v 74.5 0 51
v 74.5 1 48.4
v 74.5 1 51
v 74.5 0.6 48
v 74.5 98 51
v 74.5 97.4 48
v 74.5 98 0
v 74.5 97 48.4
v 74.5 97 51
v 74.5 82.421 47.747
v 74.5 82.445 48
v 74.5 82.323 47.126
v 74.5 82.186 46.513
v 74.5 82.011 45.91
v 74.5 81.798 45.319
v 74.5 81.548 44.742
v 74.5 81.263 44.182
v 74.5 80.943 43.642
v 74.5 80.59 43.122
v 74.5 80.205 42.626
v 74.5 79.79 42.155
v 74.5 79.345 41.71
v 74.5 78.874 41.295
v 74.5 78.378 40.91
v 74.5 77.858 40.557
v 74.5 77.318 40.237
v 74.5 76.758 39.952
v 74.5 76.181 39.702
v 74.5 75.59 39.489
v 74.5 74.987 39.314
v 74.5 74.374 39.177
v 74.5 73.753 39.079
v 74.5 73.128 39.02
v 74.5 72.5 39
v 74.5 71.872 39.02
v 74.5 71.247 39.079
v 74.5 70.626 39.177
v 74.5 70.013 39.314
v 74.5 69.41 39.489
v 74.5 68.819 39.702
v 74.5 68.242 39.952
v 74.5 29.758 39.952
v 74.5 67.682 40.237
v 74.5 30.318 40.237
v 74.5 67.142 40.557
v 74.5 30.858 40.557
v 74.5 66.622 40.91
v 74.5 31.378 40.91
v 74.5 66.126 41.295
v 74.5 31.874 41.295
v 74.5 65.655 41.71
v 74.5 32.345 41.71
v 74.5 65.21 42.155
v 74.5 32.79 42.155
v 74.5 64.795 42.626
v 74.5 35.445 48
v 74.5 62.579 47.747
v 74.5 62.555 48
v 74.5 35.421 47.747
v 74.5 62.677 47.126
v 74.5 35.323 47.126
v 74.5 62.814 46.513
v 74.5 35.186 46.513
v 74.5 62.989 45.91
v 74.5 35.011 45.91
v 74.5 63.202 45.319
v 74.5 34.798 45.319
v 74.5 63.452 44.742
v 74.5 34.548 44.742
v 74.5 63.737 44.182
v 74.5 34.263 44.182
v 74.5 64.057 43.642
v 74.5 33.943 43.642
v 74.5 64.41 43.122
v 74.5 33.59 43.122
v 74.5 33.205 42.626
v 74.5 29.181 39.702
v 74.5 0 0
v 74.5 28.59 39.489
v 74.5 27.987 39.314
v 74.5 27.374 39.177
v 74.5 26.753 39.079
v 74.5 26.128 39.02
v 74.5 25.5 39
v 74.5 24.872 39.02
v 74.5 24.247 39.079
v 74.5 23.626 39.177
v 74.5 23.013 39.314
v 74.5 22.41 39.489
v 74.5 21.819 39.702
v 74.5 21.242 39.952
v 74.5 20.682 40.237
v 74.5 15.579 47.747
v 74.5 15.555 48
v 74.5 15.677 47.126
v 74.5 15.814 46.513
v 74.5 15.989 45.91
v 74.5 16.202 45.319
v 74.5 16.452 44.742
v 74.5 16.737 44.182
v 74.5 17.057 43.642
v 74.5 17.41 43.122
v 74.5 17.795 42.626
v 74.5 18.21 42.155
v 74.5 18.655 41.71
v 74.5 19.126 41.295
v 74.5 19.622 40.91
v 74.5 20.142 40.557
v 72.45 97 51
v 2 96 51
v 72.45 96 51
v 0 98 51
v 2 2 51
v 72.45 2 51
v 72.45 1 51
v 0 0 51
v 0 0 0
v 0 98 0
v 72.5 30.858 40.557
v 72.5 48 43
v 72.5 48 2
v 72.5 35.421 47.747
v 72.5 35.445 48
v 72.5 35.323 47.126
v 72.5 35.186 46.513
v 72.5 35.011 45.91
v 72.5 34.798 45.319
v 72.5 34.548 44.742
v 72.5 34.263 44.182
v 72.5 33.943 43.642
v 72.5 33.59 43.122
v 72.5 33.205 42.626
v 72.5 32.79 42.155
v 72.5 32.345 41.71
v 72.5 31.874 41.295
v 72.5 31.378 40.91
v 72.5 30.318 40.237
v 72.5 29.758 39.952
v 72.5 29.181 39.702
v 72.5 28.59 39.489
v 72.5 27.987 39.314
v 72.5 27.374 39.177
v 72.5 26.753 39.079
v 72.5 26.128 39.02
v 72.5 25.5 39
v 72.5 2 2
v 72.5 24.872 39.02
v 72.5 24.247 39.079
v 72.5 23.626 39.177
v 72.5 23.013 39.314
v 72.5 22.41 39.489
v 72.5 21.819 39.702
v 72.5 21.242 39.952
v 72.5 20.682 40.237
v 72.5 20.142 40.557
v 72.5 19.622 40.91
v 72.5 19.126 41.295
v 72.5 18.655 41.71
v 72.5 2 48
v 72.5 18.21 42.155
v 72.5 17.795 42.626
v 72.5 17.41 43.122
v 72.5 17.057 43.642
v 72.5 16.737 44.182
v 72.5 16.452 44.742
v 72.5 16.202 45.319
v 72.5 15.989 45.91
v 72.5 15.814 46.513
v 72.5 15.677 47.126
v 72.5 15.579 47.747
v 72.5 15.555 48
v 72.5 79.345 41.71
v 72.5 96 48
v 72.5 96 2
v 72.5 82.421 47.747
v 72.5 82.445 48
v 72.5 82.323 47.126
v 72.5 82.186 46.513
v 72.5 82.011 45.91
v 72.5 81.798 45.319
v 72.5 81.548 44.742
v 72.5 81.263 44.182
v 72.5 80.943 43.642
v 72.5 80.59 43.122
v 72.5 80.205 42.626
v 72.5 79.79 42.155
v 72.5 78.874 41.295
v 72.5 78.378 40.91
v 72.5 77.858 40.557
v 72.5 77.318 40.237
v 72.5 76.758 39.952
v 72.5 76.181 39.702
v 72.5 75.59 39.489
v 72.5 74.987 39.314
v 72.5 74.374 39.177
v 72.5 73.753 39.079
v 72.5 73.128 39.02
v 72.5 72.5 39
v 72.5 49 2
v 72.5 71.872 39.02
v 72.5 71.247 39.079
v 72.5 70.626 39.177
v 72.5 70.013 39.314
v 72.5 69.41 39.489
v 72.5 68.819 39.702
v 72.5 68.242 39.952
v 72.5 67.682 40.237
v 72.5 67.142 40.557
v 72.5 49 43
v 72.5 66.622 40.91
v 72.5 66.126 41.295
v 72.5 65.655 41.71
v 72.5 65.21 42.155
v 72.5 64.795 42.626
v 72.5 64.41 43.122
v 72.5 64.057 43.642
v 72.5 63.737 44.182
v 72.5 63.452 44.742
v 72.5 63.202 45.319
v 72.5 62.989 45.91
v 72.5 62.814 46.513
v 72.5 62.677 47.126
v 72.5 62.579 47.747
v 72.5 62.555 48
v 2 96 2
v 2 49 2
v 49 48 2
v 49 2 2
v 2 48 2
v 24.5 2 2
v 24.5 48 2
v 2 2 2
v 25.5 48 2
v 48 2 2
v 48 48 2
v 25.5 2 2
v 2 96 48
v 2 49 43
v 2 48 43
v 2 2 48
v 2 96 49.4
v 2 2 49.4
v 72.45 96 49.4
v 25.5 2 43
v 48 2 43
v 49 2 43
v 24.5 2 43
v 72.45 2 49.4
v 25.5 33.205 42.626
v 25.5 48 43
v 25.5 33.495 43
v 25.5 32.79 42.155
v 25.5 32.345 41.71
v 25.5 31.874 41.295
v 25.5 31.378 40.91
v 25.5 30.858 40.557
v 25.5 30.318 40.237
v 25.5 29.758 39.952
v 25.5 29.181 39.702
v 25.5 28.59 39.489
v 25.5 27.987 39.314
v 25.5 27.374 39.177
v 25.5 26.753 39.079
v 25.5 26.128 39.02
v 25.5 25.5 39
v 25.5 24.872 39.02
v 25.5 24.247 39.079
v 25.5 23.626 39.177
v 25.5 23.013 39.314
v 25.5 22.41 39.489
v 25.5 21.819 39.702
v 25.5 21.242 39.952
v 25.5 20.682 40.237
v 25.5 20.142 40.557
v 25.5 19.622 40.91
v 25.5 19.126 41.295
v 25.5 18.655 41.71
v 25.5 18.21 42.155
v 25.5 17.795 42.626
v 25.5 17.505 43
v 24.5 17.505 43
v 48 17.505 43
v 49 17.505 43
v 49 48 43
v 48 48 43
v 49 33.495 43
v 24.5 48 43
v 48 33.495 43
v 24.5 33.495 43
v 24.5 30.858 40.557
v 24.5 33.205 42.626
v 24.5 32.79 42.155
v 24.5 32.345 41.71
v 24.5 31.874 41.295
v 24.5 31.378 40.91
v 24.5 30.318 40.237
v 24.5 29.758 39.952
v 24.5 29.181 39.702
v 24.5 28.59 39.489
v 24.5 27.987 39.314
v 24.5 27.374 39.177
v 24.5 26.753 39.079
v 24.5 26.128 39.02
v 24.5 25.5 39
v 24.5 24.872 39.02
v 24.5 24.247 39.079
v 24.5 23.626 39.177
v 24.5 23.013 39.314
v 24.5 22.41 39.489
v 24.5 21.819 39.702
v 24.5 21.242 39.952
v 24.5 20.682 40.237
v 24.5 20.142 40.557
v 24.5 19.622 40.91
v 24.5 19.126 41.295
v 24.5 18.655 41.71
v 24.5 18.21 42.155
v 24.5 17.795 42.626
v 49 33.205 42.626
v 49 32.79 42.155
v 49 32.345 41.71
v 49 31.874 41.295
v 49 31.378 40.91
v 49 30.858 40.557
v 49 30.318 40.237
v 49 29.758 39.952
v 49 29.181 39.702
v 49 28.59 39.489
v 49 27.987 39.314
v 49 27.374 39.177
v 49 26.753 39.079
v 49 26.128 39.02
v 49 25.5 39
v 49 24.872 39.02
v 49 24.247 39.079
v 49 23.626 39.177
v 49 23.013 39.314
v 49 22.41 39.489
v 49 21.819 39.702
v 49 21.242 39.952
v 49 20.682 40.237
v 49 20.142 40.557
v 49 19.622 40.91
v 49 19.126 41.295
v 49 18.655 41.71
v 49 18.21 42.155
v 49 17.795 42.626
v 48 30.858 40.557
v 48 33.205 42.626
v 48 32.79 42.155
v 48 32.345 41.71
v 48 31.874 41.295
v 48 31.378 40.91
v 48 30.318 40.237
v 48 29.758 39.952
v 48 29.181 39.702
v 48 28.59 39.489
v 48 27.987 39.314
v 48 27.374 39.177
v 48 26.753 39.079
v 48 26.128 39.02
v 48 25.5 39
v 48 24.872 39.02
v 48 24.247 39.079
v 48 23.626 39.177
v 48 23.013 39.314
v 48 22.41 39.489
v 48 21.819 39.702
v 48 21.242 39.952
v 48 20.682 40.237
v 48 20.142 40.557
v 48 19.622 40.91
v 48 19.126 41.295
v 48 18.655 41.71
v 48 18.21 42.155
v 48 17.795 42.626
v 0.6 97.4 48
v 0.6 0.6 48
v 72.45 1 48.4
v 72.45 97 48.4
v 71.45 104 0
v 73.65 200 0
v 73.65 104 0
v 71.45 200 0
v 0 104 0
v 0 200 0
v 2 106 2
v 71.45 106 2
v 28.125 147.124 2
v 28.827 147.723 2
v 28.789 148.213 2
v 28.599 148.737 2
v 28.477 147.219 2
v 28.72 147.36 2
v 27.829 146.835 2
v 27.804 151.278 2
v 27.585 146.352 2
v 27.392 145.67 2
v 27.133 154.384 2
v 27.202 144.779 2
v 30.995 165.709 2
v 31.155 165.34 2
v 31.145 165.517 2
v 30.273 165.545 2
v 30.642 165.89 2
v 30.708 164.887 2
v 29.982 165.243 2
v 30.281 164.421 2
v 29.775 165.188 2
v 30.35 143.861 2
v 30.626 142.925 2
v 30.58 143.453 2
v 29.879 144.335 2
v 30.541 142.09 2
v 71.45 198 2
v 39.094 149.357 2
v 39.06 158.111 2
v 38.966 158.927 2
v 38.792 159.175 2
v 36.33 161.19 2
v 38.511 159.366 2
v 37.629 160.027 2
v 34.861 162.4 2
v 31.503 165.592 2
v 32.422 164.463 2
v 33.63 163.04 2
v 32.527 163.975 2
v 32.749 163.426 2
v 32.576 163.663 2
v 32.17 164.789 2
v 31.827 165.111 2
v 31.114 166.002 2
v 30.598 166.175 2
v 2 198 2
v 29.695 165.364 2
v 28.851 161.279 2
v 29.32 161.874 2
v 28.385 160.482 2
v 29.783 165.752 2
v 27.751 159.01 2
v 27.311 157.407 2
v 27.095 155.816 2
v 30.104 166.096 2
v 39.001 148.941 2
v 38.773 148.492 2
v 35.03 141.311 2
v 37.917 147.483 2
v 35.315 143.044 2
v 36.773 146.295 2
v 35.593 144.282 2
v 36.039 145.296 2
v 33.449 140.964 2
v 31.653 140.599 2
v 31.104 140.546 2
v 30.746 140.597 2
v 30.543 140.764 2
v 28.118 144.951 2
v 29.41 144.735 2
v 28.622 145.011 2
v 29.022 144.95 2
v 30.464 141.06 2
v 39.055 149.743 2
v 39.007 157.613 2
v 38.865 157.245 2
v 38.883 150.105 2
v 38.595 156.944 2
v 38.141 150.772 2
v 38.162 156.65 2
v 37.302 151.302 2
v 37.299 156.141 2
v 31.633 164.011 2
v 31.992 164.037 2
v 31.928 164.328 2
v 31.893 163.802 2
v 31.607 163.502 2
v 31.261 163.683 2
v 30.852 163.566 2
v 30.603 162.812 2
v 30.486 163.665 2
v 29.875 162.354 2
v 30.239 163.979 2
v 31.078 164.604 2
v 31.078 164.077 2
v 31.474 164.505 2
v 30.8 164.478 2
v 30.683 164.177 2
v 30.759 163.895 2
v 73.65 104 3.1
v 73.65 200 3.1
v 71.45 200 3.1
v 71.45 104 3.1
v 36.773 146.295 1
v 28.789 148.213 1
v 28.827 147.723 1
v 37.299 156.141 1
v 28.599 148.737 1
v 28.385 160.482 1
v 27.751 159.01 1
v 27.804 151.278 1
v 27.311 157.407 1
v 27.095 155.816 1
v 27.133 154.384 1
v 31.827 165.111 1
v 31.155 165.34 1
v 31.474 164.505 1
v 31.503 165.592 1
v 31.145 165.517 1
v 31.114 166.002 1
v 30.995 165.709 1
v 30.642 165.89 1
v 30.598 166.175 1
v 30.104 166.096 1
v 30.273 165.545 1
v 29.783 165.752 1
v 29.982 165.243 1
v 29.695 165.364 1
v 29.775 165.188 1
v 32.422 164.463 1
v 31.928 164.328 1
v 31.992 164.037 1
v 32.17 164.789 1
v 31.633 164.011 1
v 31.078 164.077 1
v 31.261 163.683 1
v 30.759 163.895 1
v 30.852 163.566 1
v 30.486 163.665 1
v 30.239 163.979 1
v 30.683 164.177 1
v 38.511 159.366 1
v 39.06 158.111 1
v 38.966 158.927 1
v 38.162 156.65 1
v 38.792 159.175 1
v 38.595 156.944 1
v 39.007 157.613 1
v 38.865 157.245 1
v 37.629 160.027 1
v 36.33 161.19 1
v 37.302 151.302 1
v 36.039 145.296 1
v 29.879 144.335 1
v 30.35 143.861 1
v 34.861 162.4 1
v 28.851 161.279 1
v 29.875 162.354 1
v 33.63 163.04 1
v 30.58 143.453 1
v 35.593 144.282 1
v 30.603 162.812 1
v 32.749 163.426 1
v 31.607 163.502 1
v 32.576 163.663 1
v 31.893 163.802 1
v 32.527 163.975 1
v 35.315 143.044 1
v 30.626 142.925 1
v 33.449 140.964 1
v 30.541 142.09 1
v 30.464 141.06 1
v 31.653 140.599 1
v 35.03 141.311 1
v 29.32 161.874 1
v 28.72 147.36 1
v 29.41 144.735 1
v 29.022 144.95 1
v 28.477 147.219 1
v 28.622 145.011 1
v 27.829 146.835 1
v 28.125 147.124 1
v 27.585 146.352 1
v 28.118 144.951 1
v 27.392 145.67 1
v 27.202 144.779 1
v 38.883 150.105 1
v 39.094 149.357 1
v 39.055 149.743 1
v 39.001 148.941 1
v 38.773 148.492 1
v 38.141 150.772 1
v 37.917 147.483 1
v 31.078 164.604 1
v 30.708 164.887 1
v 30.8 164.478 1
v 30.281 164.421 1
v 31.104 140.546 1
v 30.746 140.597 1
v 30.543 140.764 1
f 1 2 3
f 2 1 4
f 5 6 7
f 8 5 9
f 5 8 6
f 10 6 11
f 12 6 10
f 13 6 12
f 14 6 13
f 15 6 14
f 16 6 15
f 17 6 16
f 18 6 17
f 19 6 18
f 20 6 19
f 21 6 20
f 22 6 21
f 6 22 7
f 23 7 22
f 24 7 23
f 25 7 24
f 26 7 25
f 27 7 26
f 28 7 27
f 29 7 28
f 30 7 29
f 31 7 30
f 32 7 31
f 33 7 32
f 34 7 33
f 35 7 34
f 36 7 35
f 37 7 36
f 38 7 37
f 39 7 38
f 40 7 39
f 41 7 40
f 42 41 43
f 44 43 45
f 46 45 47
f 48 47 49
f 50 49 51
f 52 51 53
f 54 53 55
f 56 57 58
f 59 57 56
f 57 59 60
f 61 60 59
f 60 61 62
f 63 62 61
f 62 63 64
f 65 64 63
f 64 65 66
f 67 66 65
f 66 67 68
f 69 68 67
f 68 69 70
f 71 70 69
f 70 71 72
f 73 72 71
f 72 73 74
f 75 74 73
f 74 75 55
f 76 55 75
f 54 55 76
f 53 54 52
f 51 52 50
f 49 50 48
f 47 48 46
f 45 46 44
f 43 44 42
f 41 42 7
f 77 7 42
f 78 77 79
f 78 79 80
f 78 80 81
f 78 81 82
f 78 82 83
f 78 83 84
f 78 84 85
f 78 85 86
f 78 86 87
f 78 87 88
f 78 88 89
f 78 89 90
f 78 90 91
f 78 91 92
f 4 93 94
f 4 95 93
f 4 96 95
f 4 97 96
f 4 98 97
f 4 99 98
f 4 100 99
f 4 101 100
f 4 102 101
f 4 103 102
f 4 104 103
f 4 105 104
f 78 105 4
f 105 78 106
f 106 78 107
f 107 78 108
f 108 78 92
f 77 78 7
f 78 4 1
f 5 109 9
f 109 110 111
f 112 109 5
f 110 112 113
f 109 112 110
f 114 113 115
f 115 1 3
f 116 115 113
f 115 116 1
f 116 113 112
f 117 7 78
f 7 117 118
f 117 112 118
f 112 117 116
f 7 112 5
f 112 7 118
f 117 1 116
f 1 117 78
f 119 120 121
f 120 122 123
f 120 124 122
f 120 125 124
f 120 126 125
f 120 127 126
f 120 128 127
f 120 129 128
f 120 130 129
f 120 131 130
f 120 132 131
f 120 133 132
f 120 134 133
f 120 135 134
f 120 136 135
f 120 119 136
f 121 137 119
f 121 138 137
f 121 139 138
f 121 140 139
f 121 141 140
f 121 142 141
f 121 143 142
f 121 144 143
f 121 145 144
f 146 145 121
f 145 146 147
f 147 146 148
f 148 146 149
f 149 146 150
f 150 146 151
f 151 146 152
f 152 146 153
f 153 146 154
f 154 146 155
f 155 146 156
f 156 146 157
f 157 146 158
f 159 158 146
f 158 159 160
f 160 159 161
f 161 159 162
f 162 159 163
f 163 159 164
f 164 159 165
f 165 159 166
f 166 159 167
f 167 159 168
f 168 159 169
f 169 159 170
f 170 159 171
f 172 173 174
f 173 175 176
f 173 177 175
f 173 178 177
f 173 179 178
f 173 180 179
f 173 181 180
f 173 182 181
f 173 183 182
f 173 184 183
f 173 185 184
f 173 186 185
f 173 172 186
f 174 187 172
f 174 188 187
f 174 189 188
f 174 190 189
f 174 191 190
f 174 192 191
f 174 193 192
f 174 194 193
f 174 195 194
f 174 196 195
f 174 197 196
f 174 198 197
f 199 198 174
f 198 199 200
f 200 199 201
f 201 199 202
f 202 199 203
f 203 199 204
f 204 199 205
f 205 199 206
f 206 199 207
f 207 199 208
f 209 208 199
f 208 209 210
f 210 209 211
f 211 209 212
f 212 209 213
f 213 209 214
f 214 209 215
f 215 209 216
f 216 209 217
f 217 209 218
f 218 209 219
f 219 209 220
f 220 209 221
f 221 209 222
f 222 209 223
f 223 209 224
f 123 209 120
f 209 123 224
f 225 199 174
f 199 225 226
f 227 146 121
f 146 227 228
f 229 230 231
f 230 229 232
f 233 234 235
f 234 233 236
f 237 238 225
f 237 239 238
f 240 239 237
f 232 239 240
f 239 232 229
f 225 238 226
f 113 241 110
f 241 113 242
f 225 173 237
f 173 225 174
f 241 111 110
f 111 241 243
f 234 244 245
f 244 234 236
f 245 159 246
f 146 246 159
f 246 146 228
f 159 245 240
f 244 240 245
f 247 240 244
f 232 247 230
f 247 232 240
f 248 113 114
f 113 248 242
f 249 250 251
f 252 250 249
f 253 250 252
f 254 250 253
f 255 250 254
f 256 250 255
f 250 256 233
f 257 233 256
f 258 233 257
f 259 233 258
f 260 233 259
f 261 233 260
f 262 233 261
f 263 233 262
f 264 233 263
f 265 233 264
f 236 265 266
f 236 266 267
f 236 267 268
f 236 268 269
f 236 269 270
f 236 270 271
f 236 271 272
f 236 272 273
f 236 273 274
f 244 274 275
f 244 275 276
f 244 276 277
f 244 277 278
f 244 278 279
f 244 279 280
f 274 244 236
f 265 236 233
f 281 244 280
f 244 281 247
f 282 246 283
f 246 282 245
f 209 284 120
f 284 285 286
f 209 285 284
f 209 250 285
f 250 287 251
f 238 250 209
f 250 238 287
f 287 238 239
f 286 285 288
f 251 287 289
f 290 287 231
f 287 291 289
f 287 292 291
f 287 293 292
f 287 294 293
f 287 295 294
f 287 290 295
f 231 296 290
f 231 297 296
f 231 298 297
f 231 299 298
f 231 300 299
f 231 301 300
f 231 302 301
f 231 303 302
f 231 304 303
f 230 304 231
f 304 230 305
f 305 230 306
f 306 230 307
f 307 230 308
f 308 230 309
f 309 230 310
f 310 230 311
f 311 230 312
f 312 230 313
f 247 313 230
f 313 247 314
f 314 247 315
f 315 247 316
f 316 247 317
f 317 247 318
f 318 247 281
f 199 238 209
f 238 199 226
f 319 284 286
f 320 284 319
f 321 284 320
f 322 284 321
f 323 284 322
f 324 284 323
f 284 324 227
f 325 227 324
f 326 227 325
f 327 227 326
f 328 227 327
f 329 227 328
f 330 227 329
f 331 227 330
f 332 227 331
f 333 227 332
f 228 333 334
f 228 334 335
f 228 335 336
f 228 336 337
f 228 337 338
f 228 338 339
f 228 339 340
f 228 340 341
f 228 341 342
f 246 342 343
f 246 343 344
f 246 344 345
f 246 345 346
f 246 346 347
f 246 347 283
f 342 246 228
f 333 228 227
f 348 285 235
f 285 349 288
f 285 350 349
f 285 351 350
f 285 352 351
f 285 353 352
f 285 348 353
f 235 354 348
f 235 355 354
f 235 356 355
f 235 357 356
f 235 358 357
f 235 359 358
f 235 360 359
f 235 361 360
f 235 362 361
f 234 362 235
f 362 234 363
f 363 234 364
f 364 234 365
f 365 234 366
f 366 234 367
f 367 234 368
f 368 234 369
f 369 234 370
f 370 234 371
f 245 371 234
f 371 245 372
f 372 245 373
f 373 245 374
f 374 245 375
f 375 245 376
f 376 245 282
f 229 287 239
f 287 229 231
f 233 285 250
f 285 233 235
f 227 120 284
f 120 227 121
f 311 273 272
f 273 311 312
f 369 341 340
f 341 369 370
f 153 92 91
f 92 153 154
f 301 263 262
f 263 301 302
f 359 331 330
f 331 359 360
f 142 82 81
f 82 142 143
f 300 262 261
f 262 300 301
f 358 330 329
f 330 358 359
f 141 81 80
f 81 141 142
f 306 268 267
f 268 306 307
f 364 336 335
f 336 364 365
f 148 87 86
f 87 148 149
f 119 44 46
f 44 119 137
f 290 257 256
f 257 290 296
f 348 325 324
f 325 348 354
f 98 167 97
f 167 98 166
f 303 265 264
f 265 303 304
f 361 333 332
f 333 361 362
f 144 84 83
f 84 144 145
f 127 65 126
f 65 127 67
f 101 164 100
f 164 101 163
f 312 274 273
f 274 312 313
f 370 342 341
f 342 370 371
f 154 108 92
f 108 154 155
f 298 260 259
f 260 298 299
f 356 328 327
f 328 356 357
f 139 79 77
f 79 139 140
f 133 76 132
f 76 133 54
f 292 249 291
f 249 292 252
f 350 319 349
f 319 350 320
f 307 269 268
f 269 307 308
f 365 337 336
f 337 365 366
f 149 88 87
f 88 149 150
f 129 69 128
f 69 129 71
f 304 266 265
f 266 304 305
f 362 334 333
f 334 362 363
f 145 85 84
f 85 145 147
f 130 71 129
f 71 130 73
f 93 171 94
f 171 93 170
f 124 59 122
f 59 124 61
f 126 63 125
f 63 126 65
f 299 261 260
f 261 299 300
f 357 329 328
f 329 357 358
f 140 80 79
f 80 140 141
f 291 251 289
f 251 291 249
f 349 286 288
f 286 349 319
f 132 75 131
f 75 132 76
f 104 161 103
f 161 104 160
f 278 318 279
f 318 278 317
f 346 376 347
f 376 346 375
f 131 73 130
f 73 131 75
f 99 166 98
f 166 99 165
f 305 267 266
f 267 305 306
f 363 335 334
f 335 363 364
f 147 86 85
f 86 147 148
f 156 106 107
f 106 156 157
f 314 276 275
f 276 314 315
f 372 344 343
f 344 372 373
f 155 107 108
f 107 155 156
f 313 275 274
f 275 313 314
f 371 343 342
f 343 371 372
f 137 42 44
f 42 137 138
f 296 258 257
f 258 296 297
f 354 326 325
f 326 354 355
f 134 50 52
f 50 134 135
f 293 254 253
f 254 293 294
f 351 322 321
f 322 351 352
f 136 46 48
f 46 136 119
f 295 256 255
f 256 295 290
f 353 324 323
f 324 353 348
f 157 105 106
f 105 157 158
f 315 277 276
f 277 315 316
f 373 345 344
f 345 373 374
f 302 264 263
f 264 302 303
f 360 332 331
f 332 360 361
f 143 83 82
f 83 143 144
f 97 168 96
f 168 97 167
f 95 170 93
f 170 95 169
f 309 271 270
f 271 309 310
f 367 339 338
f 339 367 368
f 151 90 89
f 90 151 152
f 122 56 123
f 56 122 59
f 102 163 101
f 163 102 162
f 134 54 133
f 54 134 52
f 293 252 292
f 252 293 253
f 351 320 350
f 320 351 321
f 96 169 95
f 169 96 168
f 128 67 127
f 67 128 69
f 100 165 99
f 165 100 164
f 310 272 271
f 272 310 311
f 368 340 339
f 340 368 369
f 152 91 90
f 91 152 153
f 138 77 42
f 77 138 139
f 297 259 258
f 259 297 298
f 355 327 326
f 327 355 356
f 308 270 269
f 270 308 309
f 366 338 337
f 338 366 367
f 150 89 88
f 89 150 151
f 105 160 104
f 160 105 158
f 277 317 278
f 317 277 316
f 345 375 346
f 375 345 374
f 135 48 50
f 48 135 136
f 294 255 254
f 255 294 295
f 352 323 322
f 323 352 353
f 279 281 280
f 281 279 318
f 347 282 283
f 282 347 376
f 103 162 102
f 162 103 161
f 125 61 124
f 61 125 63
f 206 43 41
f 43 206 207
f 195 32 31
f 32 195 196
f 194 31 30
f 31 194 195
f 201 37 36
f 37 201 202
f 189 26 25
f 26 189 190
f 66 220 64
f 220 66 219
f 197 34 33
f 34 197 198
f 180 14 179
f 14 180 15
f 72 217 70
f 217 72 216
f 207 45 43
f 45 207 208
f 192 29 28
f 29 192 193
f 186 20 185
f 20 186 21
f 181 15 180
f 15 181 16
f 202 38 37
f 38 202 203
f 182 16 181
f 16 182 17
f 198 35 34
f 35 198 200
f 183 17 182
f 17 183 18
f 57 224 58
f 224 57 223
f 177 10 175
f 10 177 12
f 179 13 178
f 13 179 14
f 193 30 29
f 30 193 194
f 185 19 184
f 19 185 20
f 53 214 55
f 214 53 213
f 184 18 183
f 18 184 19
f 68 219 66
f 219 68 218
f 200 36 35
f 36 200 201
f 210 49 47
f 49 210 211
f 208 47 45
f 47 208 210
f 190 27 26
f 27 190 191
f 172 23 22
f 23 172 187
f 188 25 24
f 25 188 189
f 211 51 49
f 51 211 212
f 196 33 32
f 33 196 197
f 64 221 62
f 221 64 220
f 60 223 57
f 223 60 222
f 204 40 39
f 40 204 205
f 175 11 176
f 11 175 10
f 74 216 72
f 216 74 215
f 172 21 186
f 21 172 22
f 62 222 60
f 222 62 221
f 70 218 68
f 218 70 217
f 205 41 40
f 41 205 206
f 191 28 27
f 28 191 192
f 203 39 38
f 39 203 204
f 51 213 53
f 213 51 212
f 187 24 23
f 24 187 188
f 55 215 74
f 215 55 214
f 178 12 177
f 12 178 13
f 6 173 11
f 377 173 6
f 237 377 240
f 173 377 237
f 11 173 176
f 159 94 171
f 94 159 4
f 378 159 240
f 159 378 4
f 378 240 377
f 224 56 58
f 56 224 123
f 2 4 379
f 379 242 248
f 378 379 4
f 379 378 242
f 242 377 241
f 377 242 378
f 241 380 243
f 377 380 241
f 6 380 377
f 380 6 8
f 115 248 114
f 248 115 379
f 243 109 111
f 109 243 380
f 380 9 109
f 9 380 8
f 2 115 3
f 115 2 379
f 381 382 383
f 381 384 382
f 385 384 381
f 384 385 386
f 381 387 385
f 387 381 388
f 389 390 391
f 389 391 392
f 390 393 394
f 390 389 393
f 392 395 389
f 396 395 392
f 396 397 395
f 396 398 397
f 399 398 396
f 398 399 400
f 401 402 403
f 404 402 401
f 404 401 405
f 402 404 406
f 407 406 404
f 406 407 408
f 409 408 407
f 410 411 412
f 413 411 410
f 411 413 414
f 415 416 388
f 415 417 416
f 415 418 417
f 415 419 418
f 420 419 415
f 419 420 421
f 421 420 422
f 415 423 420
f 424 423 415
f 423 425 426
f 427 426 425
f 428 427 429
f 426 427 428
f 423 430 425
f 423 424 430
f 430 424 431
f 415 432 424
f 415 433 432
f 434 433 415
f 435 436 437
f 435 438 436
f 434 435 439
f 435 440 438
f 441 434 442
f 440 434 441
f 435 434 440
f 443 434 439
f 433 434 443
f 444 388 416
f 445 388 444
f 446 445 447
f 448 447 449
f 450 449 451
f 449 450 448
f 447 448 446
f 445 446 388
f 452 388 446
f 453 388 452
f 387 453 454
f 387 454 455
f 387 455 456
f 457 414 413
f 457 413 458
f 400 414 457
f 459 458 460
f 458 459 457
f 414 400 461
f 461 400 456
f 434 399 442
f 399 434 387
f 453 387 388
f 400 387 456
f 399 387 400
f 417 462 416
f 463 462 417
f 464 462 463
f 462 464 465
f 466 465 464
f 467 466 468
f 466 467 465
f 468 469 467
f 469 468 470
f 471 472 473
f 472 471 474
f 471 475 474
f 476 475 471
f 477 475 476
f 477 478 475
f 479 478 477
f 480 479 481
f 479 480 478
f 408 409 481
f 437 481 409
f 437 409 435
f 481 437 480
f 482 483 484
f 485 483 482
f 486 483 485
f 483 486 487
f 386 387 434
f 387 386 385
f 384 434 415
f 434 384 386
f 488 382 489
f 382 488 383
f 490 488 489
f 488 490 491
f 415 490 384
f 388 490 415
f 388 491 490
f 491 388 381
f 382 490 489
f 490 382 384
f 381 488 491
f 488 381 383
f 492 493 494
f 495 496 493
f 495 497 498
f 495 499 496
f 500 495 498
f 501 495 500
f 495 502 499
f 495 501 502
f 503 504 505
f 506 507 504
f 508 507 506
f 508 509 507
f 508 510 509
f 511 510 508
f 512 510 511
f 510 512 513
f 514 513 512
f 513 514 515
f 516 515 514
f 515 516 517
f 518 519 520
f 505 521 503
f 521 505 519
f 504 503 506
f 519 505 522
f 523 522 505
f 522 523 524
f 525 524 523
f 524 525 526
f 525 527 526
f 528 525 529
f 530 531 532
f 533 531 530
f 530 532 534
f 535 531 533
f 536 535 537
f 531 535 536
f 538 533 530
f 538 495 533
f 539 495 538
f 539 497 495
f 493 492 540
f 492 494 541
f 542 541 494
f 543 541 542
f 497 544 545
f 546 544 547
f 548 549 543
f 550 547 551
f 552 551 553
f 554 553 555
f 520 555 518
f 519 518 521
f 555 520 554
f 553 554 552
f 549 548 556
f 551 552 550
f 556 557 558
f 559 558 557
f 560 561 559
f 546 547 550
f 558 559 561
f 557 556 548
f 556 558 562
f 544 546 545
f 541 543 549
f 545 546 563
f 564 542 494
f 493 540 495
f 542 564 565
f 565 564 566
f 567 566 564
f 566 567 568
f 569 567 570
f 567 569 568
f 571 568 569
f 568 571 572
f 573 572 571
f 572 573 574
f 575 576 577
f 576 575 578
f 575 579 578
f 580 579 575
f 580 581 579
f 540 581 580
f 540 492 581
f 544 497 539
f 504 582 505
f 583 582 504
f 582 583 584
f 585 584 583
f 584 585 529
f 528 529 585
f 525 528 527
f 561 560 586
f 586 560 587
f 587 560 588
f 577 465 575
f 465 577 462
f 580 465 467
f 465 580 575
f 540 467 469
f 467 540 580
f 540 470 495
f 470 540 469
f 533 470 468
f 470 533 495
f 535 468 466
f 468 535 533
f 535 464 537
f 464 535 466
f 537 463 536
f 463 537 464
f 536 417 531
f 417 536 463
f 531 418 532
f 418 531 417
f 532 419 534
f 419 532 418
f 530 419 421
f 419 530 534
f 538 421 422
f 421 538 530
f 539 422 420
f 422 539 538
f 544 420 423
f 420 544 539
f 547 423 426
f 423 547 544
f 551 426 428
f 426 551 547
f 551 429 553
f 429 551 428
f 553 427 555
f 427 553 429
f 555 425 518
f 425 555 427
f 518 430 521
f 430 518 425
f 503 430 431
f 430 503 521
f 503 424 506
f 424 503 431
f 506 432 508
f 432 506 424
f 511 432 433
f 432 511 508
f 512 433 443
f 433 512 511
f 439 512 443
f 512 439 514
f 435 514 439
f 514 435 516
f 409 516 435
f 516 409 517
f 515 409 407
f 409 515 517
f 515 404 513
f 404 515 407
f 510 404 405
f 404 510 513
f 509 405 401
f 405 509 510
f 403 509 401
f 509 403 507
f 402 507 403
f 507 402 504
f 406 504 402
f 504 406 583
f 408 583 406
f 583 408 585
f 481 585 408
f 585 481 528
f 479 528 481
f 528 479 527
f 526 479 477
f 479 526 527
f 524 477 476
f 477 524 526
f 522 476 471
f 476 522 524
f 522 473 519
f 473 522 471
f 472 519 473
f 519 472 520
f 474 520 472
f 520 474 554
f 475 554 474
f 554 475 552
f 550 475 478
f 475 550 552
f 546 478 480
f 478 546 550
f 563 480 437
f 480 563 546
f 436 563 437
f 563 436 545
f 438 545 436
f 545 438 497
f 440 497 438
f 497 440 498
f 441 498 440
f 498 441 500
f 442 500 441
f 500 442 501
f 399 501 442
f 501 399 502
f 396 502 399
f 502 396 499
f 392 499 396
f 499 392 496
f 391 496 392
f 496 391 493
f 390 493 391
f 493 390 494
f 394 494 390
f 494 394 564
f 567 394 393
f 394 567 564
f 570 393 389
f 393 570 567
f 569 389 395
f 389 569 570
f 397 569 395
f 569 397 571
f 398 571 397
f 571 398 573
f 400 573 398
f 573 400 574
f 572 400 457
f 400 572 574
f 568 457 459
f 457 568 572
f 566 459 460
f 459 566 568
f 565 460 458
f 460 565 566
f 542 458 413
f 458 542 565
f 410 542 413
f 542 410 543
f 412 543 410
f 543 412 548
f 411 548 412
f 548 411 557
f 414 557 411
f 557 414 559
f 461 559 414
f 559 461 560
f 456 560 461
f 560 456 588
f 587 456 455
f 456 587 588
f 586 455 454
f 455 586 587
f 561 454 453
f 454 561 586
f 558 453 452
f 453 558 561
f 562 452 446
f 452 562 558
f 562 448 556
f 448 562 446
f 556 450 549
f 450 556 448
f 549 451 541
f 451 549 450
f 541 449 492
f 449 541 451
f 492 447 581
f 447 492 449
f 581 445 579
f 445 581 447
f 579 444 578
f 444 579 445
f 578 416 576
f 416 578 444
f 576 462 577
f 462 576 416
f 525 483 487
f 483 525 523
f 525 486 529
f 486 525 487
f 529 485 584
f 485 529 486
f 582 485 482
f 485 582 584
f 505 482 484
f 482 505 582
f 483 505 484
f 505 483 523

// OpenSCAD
// file: carcassonne_box.scad
/**
 * @file carcassonne_box.scad
 * @author Conlan Wesson
 * Template for Carcossonne boxes.
 * @copyright Creative Commons Attribution-NonCommercial-ShareAlike 4.0
 */

mm = 1;
cm = 10*mm;

width = 47*mm;
thick = 2.5*mm;
wall = 2*mm;

/**
 * Lid for box.
 * @param count Number of cards.
 * @param columns Number of columns.
 * @param icon Path to icon DXF file.
 * @param rot Icon rotation in degrees.
 * @param mult Icon scale.
 * @param xoff X-offset of icon from center.
 * @param yoff Y-offset of icon from center.
 */
module carcassonne_lid(count, columns=1, icon=false, rot=0, mult=1, xoff=0, yoff=0, g=0){
	length = (thick * count) + ((width/2) - ((thick * count) % (width/2)));
	w = length+(1.5*wall)+.1;
	l = (width*columns)+wall;
	h = wall;
	d = 2;

	CubePoints = [
		[ 0-g, 0-g,   0 ],  //0
		[ w+g, 0-g,   0 ],  //1
		[ w+g, l+g,   0 ],  //2
		[ 0-g, l+g,   0 ],  //3
		[   d,   d, h+g ],  //4
		[   w,   d, h+g ],  //5
		[   w, l-d, h+g ],  //6
		[   d, l-d, h+g ]   //7
	];
	
	CubeFaces = [
		[0,1,2,3],  // bottom
		[4,5,1,0],  // front
		[7,6,5,4],  // top
		[5,6,2,1],  // right
		[6,7,3,2],  // back
		[7,4,0,3]   // left
	];
	
	
	difference(){
		union(){
			polyhedron( CubePoints, CubeFaces );
			translate([w-wall-.15,0,0]) cube([wall+.2,l, (1.5*wall)+.1]);
		}
		if(icon){
			translate([w/2+xoff,l/3+yoff,h-(wall/2)]){
				linear_extrude(height=(wall)+.1){
					rotate(rot) scale(mult) import(icon);
				}
			}
		}
	}
}

/**
 * Carcassonne card box.
 * @param count Number of cards.
 * @param dividers Array of divider positions.
 * @param columns Number of columns.
 */
module carcassonne_box(count, dividers=[], columns=1){
	length = (thick * count) + ((width/2) - ((thick * count) % (width/2)));
	difference(){
		union(){
			difference(){
				// Outer walls
				cube([length+(2*wall), (width*columns)+(2*wall), width+(2*wall)]);
				// Cavity
				translate([wall, wall, wall]){
					cube([length, width*columns, (width+wall)+.1]);
				}
			}
			// Dividers
			for(col = [0:columns-1]){
				for(div = dividers[col]){
					translate([(div*(width/2))+(wall/2), width*col+wall, 0]) cube([wall/2, width, width-(2*wall)]);
				}
				if(col > 0){
					translate([0, width*col+(wall/2), 0]) cube([length+(2*wall), wall/2, width-(2*wall)]);
				}
			}
		}
		union(){
			// Notch
			for(col = [0:columns-1]){
				translate([wall, wall+(width*col), wall]){
					translate([0, width/2, width])
					rotate([0, 90, 0]){
						cylinder(r=10, h=length+(2*wall), $fn=100);
					}
				}
			}
			// Track
			translate([wall/2,wall/2,width+wall/2]) carcassonne_lid(count, columns, g=0.4);
		}
	}
}
// main file
/**
 * @file tradersbuilders.scad
 * @author Conlan Wesson
 * Traders and Builders Carcossonne box.
 * @copyright Creative Commons Attribution-NonCommercial-ShareAlike 4.0
 */

include <carcassonne_box.scad>

count = 24;
dividers = [[1, 2]];
columns = 2;

carcassonne_box(count, dividers, columns);
translate([0,width*columns+10,0]) carcassonne_lid(count, columns, icon="tradersbuilders.dxf", rot=90, mult=0.7, xoff=6, yoff=2);
